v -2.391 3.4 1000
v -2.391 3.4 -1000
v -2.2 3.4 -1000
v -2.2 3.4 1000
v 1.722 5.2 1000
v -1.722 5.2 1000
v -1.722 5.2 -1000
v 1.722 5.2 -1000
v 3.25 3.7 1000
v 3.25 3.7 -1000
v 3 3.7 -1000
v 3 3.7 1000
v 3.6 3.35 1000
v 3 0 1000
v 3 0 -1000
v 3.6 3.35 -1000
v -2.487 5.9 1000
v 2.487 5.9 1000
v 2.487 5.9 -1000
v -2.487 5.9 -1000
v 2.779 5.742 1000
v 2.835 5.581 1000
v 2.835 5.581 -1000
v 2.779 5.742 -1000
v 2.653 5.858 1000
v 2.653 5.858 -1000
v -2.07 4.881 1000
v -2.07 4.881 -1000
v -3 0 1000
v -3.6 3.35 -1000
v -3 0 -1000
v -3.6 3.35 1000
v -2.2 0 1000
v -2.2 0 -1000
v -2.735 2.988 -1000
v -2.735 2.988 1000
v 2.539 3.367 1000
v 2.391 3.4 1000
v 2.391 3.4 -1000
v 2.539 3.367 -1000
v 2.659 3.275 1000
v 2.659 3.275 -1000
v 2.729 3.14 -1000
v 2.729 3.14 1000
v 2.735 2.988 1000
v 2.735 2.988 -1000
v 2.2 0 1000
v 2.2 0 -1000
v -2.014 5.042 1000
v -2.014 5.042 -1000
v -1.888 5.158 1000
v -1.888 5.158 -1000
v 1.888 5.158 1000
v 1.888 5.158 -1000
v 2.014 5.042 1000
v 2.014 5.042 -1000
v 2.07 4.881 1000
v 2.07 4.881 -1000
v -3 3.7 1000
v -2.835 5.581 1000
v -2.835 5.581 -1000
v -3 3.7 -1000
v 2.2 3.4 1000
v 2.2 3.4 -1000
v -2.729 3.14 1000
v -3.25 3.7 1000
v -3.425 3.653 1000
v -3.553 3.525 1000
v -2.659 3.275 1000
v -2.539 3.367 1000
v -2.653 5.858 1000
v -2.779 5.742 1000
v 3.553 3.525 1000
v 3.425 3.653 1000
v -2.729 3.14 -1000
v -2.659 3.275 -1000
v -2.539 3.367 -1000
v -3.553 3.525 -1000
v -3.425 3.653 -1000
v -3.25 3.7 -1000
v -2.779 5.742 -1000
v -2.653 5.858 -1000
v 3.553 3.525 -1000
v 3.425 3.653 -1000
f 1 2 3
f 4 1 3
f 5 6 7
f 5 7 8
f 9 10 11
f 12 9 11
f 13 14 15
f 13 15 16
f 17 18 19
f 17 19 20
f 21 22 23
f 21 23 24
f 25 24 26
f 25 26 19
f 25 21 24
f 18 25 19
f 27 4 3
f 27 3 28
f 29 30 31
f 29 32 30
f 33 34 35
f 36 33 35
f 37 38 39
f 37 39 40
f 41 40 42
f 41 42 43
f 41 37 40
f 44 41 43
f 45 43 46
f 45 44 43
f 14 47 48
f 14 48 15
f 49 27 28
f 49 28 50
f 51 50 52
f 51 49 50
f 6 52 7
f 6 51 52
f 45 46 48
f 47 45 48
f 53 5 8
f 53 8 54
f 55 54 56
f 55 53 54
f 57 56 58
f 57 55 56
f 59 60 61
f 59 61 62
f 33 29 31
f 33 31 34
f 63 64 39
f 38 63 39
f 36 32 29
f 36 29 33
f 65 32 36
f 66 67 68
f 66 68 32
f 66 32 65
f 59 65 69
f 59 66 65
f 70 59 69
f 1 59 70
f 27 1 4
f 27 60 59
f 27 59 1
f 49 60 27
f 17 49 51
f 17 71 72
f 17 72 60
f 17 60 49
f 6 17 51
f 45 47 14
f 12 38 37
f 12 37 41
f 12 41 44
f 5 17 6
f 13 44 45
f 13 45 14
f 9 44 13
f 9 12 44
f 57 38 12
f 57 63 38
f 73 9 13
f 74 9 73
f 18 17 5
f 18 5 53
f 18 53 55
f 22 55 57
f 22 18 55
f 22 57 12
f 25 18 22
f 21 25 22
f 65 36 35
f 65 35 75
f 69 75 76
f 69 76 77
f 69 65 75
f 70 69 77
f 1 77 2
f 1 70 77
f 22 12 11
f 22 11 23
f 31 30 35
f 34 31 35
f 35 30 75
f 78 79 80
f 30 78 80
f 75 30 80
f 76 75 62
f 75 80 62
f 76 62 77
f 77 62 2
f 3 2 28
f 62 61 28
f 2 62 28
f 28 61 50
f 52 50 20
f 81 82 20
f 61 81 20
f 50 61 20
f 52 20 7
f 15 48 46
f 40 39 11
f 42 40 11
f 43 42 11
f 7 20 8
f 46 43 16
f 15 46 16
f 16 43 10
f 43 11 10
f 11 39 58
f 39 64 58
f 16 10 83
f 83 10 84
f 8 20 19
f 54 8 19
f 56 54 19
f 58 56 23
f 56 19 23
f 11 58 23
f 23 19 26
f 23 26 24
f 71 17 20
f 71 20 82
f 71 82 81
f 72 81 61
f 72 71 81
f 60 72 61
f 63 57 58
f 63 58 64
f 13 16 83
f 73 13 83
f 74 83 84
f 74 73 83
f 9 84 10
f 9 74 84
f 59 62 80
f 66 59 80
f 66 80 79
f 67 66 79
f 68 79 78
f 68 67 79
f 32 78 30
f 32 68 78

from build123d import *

# Parameters (mm, degrees)
BOSS_EXTRUDE1_DEPTH      = 1000
BOSS_EXTRUDE1_DEPTH_BACK = 1000


with BuildPart() as part:
    # Sketch1 → Boss-Extrude1 (new, two sides: drawn at the far end of the back side and taken through both)
    with BuildSketch(Plane.XY.offset(-BOSS_EXTRUDE1_DEPTH_BACK)):
        with BuildLine():
            Line((-3.6, 3.35), (-3, 0))
            Line((-3, 0), (-2.2, 0))
            Line((-2.2, 0), (-2.735217071, 2.988295315))
            ThreePointArc((-2.735217071, 2.988295315), (-2.659117427, 3.274614514), (-2.390699246, 3.4))
            Line((-2.390699246, 3.4), (-2.2, 3.4))
            Line((-2.2, 3.4), (-2.070472639, 4.88050451))
            ThreePointArc((-2.070472639, 4.88050451), (-1.958261067, 5.108047068), (-1.721804495, 5.2))
            Line((-1.721804495, 5.2), (1.721804495, 5.2))
            ThreePointArc((1.721804495, 5.2), (1.958261067, 5.108047068), (2.070472639, 4.88050451))
            Line((2.070472639, 4.88050451), (2.2, 3.4))
            Line((2.2, 3.4), (2.390699246, 3.4))
            ThreePointArc((2.390699246, 3.4), (2.659117427, 3.274614514), (2.735217071, 2.988295315))
            Line((2.735217071, 2.988295315), (2.2, 0))
            Line((2.2, 0), (3, 0))
            Line((3, 0), (3.6, 3.35))
            ThreePointArc((3.6, 3.35), (3.497487373, 3.597487373), (3.25, 3.7))
            Line((3.25, 3.7), (3, 3.7))
            Line((3, 3.7), (2.835477174, 5.58050451))
            ThreePointArc((2.835477174, 5.58050451), (2.723265602, 5.808047068), (2.486809029, 5.9))
            Line((2.486809029, 5.9), (-2.486809029, 5.9))
            ThreePointArc((-2.486809029, 5.9), (-2.723265602, 5.808047068), (-2.835477174, 5.58050451))
            Line((-2.835477174, 5.58050451), (-3, 3.7))
            Line((-3, 3.7), (-3.25, 3.7))
            ThreePointArc((-3.25, 3.7), (-3.497487373, 3.597487373), (-3.6, 3.35))
        make_face()
    extrude(amount=BOSS_EXTRUDE1_DEPTH + BOSS_EXTRUDE1_DEPTH_BACK)


solid = part.part
